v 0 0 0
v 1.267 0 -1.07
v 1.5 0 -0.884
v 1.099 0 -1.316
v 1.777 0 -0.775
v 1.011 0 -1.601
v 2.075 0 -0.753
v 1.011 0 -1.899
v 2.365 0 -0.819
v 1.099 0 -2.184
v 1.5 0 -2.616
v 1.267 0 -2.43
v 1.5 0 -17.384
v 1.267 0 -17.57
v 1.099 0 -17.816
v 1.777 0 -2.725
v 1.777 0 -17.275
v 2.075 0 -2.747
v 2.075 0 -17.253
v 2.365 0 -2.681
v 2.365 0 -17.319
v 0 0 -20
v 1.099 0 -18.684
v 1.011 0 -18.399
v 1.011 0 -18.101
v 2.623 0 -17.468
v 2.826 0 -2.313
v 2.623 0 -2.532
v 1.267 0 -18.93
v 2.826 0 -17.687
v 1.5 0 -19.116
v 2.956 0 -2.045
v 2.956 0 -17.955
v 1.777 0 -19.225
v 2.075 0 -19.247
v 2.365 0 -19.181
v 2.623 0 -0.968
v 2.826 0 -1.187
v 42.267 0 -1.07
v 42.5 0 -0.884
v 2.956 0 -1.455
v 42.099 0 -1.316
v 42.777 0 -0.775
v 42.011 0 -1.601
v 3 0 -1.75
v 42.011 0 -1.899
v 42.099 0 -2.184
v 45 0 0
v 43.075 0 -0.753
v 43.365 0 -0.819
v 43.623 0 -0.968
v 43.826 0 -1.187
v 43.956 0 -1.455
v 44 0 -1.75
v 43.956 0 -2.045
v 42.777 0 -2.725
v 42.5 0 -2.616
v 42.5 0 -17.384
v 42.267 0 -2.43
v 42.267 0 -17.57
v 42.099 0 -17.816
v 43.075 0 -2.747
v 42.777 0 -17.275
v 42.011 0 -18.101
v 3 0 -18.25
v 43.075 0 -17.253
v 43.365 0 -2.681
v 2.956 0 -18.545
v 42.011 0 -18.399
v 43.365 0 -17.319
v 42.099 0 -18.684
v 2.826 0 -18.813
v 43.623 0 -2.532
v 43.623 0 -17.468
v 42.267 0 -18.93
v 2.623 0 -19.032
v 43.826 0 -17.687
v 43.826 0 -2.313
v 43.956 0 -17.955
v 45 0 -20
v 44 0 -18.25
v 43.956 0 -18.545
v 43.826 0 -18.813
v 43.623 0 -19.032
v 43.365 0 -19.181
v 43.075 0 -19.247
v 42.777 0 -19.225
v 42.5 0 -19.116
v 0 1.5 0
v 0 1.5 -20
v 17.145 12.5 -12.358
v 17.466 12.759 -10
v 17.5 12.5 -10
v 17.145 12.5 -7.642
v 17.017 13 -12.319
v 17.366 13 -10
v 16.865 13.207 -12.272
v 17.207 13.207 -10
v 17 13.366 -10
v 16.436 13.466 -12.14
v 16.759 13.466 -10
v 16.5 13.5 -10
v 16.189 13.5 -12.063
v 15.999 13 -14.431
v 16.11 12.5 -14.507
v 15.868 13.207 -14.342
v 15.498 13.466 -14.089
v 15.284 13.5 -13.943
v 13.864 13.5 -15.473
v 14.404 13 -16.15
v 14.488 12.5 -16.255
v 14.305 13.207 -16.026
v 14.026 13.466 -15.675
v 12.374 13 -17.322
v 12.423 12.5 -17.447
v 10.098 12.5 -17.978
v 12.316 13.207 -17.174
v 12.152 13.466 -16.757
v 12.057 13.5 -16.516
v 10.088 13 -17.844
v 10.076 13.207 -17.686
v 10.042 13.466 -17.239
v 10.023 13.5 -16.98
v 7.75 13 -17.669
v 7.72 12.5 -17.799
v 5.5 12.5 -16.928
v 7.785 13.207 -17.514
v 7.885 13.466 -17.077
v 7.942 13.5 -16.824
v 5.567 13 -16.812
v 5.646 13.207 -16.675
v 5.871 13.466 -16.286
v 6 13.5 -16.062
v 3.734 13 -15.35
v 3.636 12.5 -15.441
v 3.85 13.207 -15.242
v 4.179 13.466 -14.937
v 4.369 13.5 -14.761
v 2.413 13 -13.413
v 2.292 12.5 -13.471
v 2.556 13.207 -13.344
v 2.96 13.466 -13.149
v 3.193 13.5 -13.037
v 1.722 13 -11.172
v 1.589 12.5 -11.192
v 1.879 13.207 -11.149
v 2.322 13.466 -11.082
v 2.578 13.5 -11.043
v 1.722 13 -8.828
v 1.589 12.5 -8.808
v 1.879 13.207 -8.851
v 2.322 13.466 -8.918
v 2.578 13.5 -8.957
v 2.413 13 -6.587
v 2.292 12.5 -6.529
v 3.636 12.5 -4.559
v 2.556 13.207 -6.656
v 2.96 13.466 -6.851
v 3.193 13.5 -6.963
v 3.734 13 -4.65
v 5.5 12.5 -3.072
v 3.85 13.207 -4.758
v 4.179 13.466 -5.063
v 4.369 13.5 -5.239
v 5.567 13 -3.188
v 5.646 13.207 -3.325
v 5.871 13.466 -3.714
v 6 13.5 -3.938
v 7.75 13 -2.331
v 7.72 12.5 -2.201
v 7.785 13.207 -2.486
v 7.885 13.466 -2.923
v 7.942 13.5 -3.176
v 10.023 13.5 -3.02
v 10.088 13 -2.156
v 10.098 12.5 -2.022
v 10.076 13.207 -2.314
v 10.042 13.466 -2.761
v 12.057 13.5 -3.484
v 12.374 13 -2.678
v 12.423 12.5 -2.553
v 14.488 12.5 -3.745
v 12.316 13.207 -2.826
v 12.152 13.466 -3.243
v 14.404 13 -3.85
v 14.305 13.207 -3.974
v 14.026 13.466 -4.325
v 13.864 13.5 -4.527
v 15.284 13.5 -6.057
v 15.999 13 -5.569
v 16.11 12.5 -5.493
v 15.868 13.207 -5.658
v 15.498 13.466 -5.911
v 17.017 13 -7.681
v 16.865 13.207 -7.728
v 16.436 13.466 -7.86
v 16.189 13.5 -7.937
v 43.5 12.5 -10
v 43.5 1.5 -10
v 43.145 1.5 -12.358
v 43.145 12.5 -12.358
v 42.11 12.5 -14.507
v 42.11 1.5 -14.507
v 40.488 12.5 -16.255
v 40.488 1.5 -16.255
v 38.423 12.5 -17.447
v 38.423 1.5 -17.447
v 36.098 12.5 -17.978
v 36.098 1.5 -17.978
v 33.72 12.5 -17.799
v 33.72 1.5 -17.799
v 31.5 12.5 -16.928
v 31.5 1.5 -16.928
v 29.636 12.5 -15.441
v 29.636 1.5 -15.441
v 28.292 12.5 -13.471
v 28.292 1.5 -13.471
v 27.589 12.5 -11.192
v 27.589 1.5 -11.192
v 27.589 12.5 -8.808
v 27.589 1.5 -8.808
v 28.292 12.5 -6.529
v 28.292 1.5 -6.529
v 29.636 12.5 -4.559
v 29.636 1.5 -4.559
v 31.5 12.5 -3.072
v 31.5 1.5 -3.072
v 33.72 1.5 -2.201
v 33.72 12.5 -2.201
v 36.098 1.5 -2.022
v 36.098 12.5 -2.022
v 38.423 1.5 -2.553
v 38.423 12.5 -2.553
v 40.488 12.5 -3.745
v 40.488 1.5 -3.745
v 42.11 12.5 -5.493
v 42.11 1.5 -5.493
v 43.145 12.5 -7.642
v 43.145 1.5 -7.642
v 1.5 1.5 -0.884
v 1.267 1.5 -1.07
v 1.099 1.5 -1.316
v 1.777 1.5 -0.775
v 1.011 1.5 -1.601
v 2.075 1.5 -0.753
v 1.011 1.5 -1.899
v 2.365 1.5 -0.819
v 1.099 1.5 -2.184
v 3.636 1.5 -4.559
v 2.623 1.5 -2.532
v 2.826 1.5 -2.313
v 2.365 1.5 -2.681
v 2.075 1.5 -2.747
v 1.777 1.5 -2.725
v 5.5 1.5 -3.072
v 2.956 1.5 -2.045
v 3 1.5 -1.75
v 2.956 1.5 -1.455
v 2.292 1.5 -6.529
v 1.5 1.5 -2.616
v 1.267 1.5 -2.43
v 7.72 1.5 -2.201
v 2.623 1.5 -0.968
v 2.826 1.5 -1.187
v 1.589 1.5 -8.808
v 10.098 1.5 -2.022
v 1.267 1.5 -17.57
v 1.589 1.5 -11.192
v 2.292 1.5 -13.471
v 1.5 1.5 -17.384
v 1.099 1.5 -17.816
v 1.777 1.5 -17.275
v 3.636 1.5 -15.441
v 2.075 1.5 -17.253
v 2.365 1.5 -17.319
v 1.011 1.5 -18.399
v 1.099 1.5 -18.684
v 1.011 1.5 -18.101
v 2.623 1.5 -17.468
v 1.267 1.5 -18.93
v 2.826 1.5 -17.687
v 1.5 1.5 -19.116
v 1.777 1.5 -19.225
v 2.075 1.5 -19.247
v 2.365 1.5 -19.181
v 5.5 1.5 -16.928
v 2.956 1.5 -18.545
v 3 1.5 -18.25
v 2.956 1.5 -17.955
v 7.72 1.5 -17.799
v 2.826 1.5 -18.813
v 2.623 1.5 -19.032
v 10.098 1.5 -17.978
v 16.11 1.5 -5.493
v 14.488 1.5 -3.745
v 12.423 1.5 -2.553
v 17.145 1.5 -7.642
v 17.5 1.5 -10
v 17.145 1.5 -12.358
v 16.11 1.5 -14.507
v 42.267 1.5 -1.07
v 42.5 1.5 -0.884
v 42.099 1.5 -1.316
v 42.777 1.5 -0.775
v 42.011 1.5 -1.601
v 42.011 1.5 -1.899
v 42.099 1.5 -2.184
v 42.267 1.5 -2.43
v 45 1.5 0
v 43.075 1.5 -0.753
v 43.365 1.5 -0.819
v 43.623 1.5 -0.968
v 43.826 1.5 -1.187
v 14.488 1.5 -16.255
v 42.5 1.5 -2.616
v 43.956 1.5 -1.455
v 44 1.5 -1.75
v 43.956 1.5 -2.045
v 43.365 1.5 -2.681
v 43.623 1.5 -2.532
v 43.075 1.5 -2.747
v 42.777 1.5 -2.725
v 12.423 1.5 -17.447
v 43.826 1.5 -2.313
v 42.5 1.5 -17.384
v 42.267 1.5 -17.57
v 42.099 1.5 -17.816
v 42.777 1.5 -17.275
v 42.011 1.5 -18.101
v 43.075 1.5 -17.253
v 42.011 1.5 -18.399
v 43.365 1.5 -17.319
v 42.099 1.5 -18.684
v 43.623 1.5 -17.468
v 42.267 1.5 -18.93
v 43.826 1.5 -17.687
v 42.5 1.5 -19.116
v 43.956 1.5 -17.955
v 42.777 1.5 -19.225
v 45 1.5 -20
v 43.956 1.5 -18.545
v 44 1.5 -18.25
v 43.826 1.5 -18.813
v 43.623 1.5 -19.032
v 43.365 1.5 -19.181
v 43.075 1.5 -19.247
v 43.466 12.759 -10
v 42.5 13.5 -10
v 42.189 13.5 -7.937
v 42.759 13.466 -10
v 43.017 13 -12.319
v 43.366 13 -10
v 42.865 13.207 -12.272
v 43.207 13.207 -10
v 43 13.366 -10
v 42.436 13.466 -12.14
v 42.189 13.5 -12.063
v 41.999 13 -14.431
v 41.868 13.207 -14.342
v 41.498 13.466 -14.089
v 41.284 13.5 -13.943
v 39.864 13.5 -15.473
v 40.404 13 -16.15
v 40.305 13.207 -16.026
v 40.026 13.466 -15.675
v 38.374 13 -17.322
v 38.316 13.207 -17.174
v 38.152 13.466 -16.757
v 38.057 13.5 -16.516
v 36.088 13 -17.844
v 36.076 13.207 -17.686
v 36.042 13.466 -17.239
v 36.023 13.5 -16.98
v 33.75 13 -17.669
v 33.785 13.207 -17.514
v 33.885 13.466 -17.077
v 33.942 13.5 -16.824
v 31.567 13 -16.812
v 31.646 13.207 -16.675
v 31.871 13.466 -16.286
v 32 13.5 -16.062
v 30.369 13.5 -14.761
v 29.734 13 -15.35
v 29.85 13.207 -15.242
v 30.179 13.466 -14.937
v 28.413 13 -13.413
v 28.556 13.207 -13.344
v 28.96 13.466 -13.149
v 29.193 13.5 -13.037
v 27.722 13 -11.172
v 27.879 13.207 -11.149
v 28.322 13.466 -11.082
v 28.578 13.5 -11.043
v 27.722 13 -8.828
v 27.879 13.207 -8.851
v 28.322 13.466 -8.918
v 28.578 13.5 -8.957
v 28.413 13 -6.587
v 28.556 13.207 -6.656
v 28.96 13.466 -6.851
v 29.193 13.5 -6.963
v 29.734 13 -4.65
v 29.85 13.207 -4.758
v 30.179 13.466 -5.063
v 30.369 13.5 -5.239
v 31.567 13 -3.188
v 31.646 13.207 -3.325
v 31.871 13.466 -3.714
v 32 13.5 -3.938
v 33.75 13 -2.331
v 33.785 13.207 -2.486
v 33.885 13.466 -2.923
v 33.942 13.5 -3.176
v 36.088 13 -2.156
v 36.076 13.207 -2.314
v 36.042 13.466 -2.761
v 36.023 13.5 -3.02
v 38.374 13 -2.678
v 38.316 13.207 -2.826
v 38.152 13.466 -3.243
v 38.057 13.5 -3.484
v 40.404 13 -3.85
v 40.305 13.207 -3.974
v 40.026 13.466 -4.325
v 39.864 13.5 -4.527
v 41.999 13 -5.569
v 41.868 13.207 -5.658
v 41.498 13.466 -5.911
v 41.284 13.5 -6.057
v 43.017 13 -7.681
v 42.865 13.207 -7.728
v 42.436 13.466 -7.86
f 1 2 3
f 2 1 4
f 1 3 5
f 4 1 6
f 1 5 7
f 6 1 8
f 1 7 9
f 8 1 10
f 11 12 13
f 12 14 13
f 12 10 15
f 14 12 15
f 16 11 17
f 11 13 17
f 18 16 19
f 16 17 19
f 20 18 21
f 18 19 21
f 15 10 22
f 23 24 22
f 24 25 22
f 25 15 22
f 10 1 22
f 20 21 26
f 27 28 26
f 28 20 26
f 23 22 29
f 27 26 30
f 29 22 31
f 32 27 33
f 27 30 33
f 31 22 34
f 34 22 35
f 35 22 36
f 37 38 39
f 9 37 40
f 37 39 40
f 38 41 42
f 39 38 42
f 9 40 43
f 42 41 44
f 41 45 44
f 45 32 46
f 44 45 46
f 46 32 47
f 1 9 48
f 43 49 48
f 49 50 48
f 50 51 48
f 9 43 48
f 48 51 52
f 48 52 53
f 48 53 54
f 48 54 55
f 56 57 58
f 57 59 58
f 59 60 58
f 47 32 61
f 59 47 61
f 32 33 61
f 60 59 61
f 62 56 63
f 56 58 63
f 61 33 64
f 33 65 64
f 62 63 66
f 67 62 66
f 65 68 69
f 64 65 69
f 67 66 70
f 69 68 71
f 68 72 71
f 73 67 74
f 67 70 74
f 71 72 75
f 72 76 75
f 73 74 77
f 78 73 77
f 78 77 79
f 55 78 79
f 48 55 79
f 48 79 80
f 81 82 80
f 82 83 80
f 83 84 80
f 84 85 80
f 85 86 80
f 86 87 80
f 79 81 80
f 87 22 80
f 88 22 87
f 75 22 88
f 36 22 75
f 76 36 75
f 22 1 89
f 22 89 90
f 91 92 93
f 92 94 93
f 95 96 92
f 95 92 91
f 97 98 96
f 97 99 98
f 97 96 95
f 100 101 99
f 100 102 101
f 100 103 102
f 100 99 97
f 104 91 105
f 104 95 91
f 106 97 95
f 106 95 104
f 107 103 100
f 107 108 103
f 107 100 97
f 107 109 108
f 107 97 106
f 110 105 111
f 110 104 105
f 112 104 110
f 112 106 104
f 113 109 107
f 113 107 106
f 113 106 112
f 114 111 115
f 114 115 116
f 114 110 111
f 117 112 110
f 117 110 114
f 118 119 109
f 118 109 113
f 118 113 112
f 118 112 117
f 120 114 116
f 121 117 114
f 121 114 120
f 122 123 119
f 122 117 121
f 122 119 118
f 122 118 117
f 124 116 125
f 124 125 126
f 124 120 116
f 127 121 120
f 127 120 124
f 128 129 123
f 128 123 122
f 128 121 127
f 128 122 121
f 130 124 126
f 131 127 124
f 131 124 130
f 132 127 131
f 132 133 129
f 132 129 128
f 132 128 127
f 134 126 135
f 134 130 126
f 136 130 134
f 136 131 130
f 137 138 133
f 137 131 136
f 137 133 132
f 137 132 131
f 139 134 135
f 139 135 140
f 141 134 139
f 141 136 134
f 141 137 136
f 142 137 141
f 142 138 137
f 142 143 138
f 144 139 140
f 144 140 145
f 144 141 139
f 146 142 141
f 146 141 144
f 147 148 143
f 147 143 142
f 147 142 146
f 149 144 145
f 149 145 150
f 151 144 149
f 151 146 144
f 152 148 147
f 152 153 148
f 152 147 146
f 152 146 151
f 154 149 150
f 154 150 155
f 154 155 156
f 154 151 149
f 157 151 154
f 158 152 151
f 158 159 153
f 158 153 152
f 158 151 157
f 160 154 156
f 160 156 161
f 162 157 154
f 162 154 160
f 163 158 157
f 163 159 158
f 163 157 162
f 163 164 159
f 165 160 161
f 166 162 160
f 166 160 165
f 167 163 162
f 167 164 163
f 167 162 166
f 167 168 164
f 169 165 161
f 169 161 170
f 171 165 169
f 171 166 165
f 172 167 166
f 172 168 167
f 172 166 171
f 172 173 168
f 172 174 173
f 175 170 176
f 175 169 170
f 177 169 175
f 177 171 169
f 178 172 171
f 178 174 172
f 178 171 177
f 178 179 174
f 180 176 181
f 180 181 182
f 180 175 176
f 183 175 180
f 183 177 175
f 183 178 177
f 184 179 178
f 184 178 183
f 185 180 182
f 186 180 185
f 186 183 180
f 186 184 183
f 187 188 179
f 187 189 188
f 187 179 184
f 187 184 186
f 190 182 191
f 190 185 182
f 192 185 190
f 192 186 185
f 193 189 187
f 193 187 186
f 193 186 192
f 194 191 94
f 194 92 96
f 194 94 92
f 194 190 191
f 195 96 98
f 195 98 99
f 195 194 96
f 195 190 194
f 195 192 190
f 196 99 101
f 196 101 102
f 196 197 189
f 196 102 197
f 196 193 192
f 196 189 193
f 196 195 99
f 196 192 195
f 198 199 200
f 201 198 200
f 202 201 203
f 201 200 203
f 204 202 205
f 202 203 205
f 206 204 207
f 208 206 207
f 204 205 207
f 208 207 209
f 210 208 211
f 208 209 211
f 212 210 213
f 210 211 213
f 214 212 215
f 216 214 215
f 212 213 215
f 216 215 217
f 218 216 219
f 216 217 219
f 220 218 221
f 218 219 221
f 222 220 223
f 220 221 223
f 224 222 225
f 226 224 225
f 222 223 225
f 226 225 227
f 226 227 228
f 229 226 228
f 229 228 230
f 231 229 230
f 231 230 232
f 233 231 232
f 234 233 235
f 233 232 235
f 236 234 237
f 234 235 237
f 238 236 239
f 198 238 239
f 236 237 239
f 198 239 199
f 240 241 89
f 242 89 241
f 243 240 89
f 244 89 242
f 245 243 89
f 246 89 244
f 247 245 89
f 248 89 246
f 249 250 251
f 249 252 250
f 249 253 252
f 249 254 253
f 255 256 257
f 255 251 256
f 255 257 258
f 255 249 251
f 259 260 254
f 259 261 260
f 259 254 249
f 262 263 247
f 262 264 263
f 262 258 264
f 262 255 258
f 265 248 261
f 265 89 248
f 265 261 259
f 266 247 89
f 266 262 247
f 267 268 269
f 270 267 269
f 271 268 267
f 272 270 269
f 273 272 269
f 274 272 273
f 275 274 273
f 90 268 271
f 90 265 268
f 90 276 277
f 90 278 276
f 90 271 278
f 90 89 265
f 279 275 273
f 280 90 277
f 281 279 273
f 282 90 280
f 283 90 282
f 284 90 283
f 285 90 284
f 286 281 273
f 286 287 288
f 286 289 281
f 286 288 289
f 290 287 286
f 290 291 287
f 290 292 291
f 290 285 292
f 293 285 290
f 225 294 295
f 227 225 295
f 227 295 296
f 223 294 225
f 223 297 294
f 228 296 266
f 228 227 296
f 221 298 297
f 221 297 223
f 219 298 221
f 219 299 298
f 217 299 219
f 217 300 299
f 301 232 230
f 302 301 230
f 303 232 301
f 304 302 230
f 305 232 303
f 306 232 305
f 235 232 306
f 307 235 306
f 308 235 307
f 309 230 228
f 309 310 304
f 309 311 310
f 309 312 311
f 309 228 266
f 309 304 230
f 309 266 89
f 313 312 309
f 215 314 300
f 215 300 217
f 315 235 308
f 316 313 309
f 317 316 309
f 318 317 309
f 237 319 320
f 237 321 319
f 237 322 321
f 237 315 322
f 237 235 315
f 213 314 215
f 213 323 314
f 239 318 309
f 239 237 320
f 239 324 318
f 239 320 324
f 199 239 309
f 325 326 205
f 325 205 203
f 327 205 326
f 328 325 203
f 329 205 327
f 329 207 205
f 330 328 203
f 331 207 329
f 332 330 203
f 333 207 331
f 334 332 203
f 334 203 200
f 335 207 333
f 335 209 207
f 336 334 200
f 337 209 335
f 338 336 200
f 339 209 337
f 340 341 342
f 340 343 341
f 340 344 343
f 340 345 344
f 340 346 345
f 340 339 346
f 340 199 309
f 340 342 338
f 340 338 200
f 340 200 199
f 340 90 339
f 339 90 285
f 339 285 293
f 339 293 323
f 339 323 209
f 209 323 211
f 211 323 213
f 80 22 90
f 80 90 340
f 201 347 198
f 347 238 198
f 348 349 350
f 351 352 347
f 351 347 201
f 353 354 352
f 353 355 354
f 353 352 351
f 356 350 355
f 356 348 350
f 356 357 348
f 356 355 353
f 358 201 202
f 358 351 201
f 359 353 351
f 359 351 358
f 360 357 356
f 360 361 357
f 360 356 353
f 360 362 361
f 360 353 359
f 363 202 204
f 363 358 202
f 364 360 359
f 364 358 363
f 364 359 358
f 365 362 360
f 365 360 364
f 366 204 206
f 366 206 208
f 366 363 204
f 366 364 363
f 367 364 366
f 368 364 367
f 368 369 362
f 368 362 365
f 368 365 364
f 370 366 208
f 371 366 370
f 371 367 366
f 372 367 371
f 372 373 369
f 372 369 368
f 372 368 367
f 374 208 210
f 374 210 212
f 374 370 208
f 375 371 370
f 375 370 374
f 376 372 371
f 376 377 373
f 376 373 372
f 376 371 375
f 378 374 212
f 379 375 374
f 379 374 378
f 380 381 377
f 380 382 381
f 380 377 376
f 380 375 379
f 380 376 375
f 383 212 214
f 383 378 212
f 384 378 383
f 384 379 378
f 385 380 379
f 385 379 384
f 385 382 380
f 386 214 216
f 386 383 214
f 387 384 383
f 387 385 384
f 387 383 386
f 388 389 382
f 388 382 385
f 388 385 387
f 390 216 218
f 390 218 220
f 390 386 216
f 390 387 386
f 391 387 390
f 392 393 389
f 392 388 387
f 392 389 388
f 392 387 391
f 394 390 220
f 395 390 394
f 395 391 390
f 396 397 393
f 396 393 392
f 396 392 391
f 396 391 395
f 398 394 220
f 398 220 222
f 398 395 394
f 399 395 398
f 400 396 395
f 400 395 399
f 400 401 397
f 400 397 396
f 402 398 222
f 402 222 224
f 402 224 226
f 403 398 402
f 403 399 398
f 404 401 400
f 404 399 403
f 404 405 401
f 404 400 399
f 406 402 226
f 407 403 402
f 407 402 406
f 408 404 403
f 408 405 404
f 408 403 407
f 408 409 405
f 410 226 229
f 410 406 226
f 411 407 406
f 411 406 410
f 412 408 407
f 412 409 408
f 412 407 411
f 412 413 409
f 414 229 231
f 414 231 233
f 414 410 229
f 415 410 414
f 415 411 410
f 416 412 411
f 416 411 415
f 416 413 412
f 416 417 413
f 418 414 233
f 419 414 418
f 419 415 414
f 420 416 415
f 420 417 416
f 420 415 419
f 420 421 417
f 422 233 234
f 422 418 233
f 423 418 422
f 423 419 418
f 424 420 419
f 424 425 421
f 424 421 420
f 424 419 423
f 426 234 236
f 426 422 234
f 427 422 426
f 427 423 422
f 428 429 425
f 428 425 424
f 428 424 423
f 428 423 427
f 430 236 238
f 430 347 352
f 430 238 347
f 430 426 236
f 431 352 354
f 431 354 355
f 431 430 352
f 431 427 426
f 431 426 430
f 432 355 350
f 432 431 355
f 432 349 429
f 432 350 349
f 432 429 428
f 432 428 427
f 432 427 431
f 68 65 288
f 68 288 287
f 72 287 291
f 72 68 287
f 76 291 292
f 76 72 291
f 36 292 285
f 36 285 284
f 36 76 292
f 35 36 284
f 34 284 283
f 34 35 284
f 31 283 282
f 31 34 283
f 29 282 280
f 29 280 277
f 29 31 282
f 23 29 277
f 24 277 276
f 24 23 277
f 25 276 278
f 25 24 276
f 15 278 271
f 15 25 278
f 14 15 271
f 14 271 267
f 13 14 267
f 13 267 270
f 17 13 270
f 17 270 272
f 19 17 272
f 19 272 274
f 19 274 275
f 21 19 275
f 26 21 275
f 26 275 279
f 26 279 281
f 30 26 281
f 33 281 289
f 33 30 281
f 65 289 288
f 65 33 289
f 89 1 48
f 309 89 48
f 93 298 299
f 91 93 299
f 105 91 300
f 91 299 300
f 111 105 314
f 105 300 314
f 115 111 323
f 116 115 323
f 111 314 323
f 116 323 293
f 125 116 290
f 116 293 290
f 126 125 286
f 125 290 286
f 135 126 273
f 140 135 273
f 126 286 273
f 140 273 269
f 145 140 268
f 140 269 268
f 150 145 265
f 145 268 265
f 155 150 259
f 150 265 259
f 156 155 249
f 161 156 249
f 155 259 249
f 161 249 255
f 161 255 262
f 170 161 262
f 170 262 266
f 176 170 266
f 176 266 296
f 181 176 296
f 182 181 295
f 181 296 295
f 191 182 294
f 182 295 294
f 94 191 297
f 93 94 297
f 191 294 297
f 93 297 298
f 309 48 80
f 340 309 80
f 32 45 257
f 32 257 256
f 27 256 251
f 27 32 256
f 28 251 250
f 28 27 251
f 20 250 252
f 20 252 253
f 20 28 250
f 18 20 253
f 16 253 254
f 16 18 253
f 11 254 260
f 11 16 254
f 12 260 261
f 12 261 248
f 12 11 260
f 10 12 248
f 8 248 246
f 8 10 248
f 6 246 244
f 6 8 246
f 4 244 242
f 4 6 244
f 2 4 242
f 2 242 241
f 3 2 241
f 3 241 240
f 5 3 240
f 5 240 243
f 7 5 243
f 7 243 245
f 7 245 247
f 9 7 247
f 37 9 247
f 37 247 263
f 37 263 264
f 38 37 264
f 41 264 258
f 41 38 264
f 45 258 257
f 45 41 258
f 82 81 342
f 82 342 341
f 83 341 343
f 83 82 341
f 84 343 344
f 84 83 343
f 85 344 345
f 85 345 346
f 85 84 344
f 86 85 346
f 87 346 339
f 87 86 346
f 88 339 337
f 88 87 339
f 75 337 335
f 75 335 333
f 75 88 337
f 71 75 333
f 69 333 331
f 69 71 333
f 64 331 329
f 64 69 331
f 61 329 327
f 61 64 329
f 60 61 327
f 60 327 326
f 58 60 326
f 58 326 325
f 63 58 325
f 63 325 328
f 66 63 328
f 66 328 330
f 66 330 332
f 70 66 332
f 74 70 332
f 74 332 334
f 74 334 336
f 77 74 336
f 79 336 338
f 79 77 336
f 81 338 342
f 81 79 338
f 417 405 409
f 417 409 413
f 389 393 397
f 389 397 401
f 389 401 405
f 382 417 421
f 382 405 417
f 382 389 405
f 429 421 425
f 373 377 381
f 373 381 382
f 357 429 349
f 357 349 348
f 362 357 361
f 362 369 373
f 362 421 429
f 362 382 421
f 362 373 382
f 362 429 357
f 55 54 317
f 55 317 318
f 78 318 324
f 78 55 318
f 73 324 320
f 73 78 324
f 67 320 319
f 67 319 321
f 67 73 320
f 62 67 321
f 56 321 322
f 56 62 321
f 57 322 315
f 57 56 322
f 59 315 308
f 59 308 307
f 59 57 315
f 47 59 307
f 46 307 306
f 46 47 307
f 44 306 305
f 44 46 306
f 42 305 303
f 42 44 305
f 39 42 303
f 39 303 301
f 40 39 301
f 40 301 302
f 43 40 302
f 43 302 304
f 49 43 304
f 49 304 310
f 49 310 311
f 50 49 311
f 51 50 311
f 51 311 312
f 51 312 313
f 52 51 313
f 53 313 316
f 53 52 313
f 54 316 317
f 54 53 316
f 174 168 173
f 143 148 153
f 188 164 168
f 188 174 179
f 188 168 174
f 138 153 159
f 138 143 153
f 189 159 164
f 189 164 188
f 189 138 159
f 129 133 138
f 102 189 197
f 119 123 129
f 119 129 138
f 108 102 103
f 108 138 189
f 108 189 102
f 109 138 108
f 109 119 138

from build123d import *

# Parameters (mm, degrees)
SKETCH1_W           = 45
SKETCH1_H           = 20
SKETCH1_R           = 1
BOSS_EXTRUDE1_DEPTH = 1.5
SKETCH2_R           = 8
BOSS_EXTRUDE2_DEPTH = 12
FILLET1_R           = 1


with BuildPart() as part:
    # Sketch1 → Boss-Extrude1 (new body)
    with BuildSketch(Plane(origin=(0, 0, 0), x_dir=(1, 0, 0), z_dir=(0, 1, 0))):
        with Locations((22.5, 10)):
            Rectangle(SKETCH1_W, SKETCH1_H)
        with Locations((2, 18.25)):
            Circle(SKETCH1_R, mode=Mode.SUBTRACT)
        with Locations((2, 1.75)):
            Circle(SKETCH1_R, mode=Mode.SUBTRACT)
        with Locations((43, 1.75)):
            Circle(SKETCH1_R, mode=Mode.SUBTRACT)
        with Locations((43, 18.25)):
            Circle(SKETCH1_R, mode=Mode.SUBTRACT)
    extrude(amount=BOSS_EXTRUDE1_DEPTH)

    # Sketch2 → Boss-Extrude2 (add)
    with BuildSketch(Plane(origin=(0, 1.5, 0), x_dir=(1, 0, 0), z_dir=(0, 1, 0))):
        with Locations((9.5, 10)):
            Circle(SKETCH2_R)
        with Locations((35.5, 10)):
            Circle(SKETCH2_R)
    extrude(amount=BOSS_EXTRUDE2_DEPTH)

    # Fillet1
    fillet1_edges = [part.edges().sort_by_distance(p)[0] for p in [
        (1.5, 13.5, -10),
        (27.5, 13.5, -10),
    ]]
    fillet(fillet1_edges, radius=FILLET1_R)


solid = part.part
